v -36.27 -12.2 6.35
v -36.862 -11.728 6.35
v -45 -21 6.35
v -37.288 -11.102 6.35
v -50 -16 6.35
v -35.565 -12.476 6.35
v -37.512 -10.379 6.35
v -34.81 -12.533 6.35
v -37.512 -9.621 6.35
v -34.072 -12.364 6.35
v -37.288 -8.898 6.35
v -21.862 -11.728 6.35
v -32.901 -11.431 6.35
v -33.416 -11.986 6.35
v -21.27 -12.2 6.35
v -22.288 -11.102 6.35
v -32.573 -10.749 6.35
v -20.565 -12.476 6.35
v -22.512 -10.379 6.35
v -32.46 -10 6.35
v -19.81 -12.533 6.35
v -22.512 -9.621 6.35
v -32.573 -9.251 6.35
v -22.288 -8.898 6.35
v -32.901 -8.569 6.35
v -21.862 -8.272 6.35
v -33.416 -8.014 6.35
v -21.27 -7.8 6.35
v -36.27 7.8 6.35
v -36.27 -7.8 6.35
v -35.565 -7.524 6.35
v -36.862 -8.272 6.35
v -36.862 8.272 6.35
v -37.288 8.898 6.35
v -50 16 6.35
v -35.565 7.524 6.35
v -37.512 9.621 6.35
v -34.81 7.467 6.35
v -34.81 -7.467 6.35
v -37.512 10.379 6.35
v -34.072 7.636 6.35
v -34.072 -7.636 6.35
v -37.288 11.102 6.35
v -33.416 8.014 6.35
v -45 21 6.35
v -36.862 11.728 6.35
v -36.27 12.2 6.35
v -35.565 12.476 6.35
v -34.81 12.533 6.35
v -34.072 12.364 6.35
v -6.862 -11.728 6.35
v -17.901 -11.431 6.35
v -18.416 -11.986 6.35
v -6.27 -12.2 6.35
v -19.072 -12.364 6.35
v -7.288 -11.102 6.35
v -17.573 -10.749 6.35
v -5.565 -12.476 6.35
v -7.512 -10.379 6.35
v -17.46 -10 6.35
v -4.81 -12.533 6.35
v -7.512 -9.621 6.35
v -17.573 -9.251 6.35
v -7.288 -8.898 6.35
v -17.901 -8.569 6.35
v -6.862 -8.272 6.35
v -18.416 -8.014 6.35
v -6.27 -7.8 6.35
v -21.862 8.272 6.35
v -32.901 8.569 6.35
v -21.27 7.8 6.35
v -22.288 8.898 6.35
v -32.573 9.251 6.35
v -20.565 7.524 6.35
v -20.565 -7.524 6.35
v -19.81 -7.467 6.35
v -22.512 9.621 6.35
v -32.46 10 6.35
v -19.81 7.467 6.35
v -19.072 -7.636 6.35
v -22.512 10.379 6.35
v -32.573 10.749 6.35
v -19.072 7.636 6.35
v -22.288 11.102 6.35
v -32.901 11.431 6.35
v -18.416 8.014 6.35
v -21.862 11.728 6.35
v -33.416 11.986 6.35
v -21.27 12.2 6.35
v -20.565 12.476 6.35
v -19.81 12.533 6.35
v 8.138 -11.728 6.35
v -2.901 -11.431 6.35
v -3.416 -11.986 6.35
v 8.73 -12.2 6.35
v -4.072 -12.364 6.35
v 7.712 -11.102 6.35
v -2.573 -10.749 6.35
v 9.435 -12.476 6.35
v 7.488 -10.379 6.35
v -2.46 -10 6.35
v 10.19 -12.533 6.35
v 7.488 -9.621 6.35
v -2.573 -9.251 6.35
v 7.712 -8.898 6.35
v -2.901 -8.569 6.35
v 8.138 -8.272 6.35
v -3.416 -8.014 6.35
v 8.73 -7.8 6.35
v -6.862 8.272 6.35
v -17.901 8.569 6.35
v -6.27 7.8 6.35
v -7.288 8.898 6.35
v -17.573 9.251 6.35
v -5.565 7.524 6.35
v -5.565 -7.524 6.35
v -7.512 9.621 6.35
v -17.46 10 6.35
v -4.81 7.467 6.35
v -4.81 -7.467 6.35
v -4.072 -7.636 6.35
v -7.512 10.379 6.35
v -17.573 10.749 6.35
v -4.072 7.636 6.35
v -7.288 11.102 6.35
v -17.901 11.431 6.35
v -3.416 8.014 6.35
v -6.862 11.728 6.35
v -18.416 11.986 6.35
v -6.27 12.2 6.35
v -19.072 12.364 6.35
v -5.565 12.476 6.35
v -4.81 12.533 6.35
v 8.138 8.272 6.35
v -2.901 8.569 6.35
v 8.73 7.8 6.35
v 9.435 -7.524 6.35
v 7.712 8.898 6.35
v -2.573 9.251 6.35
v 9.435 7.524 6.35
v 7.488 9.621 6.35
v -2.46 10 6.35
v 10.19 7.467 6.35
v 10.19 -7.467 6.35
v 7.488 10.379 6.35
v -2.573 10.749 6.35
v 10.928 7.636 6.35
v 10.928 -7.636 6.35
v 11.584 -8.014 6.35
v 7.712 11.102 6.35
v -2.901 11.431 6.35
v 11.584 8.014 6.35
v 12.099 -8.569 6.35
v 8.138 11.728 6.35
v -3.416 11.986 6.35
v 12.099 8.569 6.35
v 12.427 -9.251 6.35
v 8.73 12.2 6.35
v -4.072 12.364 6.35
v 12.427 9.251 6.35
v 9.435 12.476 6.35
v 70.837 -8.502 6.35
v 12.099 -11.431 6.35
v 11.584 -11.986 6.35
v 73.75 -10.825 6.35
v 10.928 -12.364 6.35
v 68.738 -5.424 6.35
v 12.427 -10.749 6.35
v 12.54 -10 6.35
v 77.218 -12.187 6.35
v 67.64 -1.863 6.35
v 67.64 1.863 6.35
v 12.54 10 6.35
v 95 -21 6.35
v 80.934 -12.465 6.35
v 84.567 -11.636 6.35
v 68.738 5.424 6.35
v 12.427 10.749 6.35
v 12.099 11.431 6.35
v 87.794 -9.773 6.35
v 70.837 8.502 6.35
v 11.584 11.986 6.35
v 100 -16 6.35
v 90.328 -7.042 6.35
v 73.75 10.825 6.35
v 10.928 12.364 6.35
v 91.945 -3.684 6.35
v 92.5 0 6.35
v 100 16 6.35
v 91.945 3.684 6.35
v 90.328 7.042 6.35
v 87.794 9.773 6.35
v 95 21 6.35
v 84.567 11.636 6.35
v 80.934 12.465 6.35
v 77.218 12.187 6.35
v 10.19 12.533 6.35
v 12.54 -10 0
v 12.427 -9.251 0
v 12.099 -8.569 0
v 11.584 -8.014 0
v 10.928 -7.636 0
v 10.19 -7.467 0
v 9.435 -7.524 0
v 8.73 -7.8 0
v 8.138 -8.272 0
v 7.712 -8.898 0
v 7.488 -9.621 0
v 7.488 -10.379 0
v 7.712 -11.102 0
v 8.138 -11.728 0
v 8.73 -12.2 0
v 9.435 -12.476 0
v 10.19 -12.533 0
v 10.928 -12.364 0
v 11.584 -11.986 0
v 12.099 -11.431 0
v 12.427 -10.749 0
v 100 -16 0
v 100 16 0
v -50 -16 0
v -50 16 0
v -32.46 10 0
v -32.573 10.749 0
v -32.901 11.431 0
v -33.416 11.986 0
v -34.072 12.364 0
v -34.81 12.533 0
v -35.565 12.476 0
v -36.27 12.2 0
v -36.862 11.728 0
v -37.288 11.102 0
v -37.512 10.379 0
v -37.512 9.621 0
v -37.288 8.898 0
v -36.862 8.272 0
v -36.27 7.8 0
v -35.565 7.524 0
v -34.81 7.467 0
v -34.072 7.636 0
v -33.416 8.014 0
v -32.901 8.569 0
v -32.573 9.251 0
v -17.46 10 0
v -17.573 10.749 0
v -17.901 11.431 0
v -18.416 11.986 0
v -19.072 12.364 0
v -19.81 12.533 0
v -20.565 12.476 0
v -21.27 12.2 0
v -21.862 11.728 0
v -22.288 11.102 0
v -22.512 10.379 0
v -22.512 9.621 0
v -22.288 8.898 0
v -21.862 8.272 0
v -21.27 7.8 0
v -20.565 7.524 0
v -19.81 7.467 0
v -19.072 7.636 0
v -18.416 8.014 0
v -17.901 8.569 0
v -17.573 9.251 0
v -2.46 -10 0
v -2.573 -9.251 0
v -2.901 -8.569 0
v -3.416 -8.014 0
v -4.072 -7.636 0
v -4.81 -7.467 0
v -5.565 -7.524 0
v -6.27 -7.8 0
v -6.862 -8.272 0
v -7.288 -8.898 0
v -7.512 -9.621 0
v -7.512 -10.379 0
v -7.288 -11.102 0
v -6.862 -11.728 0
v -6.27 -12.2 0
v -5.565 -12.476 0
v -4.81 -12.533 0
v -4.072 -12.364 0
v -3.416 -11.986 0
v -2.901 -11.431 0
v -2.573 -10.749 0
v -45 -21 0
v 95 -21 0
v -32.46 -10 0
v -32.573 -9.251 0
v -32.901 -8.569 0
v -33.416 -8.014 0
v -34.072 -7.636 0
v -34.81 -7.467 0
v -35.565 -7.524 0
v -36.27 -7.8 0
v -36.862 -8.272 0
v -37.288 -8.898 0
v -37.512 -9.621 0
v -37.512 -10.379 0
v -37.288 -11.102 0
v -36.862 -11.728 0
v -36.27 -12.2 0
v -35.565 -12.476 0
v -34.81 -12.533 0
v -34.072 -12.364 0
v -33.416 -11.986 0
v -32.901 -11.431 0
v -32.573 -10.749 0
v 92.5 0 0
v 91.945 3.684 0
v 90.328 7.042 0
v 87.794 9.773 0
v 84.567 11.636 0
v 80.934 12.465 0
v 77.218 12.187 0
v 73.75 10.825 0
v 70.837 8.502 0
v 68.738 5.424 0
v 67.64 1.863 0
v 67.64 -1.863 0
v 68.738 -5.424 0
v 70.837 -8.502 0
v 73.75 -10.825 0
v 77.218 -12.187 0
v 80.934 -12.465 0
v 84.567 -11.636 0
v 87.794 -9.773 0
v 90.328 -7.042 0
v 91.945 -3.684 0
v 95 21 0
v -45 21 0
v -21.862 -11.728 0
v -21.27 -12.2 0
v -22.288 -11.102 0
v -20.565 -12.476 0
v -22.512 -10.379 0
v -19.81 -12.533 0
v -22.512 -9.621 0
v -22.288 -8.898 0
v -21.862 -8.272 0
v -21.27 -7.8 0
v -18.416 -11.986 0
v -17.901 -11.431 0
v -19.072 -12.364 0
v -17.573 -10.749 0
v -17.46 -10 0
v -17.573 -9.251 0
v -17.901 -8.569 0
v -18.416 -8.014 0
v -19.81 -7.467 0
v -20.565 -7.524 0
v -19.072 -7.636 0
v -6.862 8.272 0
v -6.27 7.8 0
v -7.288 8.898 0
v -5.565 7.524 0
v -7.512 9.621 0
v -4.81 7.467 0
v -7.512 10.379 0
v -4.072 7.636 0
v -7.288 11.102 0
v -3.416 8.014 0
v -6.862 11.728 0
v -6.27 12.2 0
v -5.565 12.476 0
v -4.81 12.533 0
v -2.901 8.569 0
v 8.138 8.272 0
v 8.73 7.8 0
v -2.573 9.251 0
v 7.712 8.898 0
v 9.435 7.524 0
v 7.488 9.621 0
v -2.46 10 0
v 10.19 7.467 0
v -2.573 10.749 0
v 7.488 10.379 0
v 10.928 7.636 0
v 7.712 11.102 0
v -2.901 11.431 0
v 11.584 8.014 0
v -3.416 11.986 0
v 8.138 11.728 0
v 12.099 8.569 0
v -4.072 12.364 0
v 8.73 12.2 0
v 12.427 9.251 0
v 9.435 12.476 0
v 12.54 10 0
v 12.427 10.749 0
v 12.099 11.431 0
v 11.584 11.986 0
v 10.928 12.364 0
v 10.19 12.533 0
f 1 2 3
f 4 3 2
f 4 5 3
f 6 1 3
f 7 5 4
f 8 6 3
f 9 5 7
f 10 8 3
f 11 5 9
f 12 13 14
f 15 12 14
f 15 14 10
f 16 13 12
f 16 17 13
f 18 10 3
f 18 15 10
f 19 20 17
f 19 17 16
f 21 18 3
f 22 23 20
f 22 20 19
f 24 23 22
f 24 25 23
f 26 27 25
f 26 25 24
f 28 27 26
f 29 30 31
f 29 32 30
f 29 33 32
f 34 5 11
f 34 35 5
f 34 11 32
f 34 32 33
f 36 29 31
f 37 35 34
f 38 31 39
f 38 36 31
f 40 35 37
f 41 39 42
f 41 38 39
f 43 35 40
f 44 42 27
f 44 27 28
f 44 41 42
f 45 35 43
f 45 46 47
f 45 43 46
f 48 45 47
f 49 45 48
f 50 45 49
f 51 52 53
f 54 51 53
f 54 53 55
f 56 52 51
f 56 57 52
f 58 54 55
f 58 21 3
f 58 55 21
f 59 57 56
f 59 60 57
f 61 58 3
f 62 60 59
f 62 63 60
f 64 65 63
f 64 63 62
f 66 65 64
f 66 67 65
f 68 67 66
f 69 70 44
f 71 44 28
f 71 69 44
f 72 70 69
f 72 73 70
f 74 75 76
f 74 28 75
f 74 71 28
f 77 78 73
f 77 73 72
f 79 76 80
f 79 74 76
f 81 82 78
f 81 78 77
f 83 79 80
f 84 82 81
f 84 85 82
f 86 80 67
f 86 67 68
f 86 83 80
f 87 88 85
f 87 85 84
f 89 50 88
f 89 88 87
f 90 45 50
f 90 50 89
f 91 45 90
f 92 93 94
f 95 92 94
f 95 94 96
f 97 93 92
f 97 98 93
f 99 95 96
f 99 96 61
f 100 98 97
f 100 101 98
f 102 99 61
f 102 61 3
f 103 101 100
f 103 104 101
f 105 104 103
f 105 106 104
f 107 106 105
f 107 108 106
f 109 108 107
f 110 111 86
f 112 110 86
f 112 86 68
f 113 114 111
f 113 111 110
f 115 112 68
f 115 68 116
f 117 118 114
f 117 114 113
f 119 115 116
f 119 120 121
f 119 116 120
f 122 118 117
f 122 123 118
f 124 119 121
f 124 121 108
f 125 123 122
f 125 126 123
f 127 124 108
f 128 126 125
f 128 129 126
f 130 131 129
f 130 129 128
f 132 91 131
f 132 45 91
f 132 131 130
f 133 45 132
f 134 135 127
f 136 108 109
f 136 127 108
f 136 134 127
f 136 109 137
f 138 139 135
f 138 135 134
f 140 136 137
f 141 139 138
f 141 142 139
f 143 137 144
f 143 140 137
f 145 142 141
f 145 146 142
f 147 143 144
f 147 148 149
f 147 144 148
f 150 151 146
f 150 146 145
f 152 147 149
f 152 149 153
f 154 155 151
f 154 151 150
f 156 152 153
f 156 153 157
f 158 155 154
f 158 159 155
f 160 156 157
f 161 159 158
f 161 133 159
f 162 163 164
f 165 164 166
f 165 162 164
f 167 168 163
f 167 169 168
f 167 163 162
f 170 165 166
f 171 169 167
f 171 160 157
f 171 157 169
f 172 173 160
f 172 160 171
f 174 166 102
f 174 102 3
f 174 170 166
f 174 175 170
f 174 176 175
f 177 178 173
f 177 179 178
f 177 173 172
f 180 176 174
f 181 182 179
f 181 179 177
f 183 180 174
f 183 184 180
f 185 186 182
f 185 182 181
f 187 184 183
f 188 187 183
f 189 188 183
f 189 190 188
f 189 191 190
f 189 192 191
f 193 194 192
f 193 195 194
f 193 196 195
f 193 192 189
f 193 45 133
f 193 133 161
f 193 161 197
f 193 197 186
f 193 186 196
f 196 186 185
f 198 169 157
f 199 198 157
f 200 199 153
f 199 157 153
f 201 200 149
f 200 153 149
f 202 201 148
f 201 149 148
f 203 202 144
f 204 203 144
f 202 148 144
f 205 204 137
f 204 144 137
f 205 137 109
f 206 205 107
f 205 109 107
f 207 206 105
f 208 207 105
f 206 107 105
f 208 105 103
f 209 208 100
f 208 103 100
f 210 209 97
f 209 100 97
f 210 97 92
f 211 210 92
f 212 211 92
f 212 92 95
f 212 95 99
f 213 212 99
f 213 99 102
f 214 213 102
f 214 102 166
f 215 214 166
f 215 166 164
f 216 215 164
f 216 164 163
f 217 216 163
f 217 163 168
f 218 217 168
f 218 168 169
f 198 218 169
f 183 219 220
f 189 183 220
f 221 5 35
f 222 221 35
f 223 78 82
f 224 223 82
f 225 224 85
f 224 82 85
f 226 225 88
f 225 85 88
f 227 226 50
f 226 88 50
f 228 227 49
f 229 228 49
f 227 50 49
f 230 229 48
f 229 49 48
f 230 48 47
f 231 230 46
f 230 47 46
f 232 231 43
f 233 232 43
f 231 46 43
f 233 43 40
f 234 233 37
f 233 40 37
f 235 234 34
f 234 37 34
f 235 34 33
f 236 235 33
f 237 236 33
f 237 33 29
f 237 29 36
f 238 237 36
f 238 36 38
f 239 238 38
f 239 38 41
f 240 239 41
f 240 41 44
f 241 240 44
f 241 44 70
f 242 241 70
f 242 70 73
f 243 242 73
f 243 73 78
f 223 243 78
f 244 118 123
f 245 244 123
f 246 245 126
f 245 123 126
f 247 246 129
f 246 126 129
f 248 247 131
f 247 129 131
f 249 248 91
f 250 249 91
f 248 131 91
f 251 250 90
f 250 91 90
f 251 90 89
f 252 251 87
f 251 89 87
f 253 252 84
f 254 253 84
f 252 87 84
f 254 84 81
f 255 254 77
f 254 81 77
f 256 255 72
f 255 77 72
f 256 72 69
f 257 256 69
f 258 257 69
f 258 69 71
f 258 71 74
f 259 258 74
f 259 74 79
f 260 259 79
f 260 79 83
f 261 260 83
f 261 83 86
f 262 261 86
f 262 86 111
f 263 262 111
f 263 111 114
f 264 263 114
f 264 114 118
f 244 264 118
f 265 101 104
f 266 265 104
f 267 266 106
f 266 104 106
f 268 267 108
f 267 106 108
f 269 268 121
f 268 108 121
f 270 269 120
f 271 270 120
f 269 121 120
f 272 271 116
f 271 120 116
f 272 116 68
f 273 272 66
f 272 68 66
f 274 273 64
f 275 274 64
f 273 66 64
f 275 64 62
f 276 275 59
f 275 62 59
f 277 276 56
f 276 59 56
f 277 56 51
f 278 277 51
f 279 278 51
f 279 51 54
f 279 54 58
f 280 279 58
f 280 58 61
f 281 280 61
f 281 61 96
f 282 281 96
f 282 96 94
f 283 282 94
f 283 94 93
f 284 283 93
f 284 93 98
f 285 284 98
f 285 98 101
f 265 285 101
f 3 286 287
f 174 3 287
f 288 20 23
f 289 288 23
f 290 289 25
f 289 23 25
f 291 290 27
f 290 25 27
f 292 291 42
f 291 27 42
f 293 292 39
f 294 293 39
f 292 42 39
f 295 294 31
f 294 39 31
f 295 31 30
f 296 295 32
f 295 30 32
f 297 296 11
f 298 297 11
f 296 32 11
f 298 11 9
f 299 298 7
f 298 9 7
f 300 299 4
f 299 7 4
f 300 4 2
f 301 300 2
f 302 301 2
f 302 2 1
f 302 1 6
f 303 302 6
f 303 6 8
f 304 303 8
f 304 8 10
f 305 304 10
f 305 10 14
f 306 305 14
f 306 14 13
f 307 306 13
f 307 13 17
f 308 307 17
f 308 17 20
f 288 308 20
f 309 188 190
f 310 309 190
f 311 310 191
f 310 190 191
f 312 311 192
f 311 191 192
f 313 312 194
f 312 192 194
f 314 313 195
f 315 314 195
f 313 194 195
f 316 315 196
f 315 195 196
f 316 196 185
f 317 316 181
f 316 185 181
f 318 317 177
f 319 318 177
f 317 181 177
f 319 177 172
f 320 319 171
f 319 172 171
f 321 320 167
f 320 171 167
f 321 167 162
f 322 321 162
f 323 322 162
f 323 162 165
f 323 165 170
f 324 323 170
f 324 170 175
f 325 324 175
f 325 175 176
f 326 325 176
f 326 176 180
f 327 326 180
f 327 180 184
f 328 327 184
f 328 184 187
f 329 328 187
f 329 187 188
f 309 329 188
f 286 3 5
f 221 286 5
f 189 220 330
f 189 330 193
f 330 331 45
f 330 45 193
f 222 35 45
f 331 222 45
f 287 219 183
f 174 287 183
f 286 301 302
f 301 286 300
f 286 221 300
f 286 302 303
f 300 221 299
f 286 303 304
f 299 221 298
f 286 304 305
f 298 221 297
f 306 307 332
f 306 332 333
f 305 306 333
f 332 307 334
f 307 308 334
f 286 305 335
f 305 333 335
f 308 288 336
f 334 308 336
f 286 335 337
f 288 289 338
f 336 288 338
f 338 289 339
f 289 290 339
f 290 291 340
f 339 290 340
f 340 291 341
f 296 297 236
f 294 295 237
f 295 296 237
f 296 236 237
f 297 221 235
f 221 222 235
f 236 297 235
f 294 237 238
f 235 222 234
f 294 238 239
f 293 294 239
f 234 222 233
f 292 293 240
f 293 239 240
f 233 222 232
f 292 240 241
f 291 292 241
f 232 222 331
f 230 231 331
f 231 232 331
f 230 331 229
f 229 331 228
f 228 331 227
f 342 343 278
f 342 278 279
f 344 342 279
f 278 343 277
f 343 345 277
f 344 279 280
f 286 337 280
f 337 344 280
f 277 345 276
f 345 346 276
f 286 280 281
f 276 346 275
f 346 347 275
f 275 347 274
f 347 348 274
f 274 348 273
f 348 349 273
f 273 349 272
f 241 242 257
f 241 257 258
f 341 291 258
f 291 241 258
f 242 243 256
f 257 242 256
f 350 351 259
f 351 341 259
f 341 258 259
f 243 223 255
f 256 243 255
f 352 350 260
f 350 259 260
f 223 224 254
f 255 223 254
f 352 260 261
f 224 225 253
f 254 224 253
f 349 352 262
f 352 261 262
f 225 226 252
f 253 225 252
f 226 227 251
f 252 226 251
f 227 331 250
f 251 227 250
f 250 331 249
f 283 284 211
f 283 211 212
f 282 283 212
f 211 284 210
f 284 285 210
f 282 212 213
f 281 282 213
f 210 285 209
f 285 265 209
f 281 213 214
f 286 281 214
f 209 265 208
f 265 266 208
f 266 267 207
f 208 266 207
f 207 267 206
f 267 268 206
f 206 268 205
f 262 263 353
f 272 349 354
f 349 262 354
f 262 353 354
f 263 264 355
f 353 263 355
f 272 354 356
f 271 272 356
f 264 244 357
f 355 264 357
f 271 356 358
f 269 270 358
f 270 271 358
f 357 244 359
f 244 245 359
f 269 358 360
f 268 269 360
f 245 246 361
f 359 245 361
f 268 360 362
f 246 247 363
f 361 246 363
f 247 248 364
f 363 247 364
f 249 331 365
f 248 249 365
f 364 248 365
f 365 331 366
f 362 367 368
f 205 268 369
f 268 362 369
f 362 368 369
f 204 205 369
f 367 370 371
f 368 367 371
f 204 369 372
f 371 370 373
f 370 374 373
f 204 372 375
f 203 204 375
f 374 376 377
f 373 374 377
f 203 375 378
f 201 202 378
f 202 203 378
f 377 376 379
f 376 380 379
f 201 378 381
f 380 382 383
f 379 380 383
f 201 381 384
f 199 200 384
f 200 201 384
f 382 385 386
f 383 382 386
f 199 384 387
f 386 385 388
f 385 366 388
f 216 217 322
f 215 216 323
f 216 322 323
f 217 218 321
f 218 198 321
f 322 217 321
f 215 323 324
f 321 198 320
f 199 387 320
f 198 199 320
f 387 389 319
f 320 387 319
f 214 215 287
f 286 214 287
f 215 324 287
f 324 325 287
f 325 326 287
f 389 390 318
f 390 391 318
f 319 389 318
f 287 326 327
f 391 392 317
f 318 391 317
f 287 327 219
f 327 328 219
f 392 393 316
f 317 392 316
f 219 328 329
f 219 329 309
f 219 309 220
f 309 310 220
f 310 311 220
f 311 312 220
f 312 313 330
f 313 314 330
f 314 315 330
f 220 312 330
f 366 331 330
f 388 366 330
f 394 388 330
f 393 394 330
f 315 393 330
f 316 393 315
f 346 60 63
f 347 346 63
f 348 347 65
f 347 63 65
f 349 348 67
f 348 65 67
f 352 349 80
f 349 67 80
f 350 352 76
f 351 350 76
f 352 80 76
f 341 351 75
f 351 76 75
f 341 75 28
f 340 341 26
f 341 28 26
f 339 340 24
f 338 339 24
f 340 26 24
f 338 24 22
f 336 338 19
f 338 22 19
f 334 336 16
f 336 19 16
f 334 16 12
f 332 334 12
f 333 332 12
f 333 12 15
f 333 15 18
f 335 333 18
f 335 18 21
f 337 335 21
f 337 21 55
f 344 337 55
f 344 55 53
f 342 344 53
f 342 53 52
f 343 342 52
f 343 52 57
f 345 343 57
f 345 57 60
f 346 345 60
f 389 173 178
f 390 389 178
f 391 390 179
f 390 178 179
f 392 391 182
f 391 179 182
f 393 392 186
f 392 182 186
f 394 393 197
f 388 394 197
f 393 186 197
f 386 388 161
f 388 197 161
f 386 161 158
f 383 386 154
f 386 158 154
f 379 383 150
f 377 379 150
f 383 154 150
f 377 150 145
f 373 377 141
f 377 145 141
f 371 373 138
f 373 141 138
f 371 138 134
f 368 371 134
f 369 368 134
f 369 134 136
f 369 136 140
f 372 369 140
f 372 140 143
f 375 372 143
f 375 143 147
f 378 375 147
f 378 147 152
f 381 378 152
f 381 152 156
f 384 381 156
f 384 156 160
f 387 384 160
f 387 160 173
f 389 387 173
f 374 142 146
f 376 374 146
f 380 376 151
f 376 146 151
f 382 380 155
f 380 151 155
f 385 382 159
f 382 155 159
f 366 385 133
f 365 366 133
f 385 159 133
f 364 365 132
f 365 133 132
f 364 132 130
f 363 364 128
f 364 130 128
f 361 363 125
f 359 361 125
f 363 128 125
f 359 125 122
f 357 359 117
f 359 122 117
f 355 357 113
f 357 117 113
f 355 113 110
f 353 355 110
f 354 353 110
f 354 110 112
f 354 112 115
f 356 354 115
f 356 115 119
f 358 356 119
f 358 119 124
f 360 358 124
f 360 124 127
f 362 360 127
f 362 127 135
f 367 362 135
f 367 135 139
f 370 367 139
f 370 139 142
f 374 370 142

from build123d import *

# Parameters (mm, degrees)
SKETCH1_W           = 200
SKETCH1_H           = 42
BOSS_EXTRUDE1_DEPTH = 6.35
SKETCH3_R           = 2
CUT_EXTRUDE2_DEPTH  = 103.378330227
SKETCH4_R           = 3.175
CUT_EXTRUDE3_DEPTH  = 103.378330227
CHAMFER1_SIZE       = 5
SKETCH9_R           = 3.175
CUT_EXTRUDE8_DEPTH  = 103.378330227
SKETCH10_R          = 12.5
CUT_EXTRUDE9_DEPTH  = 103.378330227
SKETCH12_R          = 3.302
CUT_EXTRUDE11_DEPTH = 103.378330227
SKETCH13_R          = 2
SKETCH13_R_2        = 3.302
SKETCH13_R_3        = 3.175
SKETCH13_R_4        = 2.54
CUT_EXTRUDE12_DEPTH = 10


with BuildPart() as part:
    # Sketch1 → Boss-Extrude1 (new body)
    with BuildSketch(Plane.XY):
        Rectangle(SKETCH1_W, SKETCH1_H)
    extrude(amount=BOSS_EXTRUDE1_DEPTH)

    # Sketch3 → Cut-Extrude2 (cut, through all)
    with BuildSketch(Plane.XY.offset(6.35)):
        with Locations((-55, 10)):
            Circle(SKETCH3_R)
        with Locations((-55, -10)):
            Circle(SKETCH3_R)
    extrude(amount=-CUT_EXTRUDE2_DEPTH, mode=Mode.SUBTRACT)

    # Sketch4 → Cut-Extrude3 (cut, through all)
    with BuildSketch(Plane.XY.offset(6.35)):
        with Locations((-76, 0)):
            Circle(SKETCH4_R)
    extrude(amount=-CUT_EXTRUDE3_DEPTH, mode=Mode.SUBTRACT)

    # Chamfer1
    chamfer1_edges = [part.edges().sort_by_distance(p)[0] for p in [
        (100, -21, 3.175),
        (-100, -21, 3.175),
        (-100, 21, 3.175),
        (100, 21, 3.175),
    ]]
    chamfer(chamfer1_edges, length=CHAMFER1_SIZE)

    # Sketch9 → Cut-Extrude8 (cut, through all)
    with BuildSketch(Plane.XY.offset(6.35)):
        with Locations((80, 0)):
            Circle(SKETCH9_R)
    extrude(amount=-CUT_EXTRUDE8_DEPTH, mode=Mode.SUBTRACT)

    # Sketch10 → Cut-Extrude9 (cut, through all)
    with BuildSketch(Plane.XY.offset(6.35)):
        with Locations((80, 0)):
            Circle(SKETCH10_R)
    extrude(amount=-CUT_EXTRUDE9_DEPTH, mode=Mode.SUBTRACT)

    # Sketch12 → Cut-Extrude11 (cut, through all)
    with BuildSketch(Plane.XY.offset(6.35)):
        with Locations((-93, 0)):
            Circle(SKETCH12_R)
    extrude(amount=-CUT_EXTRUDE11_DEPTH, mode=Mode.SUBTRACT)

    # Sketch13 → Cut-Extrude12 (cut)
    with BuildSketch(Plane.XY.offset(6.35)):
        Polygon((-50, -16), (-50, 16), (-45, 21), (-95, 21), (-100, 16), (-100, -16), (-95, -21), (-45, -21), align=None)
        with Locations((-55, -10)):
            Circle(SKETCH13_R, mode=Mode.SUBTRACT)
        with Locations((-93, 0)):
            Circle(SKETCH13_R_2, mode=Mode.SUBTRACT)
        with Locations((-76, 0)):
            Circle(SKETCH13_R_3, mode=Mode.SUBTRACT)
        with Locations((-55, 10)):
            Circle(SKETCH13_R, mode=Mode.SUBTRACT)
        with Locations((-35, 10)):
            Circle(SKETCH13_R_4)
        with Locations((-20, 10)):
            Circle(SKETCH13_R_4)
        with Locations((-5, 10)):
            Circle(SKETCH13_R_4)
        with Locations((10, 10)):
            Circle(SKETCH13_R_4)
        with Locations((-20, -10)):
            Circle(SKETCH13_R_4)
        with Locations((-5, -10)):
            Circle(SKETCH13_R_4)
        with Locations((10, -10)):
            Circle(SKETCH13_R_4)
        with Locations((-35, -10)):
            Circle(SKETCH13_R_4)
    extrude(amount=-CUT_EXTRUDE12_DEPTH, mode=Mode.SUBTRACT)


solid = part.part
